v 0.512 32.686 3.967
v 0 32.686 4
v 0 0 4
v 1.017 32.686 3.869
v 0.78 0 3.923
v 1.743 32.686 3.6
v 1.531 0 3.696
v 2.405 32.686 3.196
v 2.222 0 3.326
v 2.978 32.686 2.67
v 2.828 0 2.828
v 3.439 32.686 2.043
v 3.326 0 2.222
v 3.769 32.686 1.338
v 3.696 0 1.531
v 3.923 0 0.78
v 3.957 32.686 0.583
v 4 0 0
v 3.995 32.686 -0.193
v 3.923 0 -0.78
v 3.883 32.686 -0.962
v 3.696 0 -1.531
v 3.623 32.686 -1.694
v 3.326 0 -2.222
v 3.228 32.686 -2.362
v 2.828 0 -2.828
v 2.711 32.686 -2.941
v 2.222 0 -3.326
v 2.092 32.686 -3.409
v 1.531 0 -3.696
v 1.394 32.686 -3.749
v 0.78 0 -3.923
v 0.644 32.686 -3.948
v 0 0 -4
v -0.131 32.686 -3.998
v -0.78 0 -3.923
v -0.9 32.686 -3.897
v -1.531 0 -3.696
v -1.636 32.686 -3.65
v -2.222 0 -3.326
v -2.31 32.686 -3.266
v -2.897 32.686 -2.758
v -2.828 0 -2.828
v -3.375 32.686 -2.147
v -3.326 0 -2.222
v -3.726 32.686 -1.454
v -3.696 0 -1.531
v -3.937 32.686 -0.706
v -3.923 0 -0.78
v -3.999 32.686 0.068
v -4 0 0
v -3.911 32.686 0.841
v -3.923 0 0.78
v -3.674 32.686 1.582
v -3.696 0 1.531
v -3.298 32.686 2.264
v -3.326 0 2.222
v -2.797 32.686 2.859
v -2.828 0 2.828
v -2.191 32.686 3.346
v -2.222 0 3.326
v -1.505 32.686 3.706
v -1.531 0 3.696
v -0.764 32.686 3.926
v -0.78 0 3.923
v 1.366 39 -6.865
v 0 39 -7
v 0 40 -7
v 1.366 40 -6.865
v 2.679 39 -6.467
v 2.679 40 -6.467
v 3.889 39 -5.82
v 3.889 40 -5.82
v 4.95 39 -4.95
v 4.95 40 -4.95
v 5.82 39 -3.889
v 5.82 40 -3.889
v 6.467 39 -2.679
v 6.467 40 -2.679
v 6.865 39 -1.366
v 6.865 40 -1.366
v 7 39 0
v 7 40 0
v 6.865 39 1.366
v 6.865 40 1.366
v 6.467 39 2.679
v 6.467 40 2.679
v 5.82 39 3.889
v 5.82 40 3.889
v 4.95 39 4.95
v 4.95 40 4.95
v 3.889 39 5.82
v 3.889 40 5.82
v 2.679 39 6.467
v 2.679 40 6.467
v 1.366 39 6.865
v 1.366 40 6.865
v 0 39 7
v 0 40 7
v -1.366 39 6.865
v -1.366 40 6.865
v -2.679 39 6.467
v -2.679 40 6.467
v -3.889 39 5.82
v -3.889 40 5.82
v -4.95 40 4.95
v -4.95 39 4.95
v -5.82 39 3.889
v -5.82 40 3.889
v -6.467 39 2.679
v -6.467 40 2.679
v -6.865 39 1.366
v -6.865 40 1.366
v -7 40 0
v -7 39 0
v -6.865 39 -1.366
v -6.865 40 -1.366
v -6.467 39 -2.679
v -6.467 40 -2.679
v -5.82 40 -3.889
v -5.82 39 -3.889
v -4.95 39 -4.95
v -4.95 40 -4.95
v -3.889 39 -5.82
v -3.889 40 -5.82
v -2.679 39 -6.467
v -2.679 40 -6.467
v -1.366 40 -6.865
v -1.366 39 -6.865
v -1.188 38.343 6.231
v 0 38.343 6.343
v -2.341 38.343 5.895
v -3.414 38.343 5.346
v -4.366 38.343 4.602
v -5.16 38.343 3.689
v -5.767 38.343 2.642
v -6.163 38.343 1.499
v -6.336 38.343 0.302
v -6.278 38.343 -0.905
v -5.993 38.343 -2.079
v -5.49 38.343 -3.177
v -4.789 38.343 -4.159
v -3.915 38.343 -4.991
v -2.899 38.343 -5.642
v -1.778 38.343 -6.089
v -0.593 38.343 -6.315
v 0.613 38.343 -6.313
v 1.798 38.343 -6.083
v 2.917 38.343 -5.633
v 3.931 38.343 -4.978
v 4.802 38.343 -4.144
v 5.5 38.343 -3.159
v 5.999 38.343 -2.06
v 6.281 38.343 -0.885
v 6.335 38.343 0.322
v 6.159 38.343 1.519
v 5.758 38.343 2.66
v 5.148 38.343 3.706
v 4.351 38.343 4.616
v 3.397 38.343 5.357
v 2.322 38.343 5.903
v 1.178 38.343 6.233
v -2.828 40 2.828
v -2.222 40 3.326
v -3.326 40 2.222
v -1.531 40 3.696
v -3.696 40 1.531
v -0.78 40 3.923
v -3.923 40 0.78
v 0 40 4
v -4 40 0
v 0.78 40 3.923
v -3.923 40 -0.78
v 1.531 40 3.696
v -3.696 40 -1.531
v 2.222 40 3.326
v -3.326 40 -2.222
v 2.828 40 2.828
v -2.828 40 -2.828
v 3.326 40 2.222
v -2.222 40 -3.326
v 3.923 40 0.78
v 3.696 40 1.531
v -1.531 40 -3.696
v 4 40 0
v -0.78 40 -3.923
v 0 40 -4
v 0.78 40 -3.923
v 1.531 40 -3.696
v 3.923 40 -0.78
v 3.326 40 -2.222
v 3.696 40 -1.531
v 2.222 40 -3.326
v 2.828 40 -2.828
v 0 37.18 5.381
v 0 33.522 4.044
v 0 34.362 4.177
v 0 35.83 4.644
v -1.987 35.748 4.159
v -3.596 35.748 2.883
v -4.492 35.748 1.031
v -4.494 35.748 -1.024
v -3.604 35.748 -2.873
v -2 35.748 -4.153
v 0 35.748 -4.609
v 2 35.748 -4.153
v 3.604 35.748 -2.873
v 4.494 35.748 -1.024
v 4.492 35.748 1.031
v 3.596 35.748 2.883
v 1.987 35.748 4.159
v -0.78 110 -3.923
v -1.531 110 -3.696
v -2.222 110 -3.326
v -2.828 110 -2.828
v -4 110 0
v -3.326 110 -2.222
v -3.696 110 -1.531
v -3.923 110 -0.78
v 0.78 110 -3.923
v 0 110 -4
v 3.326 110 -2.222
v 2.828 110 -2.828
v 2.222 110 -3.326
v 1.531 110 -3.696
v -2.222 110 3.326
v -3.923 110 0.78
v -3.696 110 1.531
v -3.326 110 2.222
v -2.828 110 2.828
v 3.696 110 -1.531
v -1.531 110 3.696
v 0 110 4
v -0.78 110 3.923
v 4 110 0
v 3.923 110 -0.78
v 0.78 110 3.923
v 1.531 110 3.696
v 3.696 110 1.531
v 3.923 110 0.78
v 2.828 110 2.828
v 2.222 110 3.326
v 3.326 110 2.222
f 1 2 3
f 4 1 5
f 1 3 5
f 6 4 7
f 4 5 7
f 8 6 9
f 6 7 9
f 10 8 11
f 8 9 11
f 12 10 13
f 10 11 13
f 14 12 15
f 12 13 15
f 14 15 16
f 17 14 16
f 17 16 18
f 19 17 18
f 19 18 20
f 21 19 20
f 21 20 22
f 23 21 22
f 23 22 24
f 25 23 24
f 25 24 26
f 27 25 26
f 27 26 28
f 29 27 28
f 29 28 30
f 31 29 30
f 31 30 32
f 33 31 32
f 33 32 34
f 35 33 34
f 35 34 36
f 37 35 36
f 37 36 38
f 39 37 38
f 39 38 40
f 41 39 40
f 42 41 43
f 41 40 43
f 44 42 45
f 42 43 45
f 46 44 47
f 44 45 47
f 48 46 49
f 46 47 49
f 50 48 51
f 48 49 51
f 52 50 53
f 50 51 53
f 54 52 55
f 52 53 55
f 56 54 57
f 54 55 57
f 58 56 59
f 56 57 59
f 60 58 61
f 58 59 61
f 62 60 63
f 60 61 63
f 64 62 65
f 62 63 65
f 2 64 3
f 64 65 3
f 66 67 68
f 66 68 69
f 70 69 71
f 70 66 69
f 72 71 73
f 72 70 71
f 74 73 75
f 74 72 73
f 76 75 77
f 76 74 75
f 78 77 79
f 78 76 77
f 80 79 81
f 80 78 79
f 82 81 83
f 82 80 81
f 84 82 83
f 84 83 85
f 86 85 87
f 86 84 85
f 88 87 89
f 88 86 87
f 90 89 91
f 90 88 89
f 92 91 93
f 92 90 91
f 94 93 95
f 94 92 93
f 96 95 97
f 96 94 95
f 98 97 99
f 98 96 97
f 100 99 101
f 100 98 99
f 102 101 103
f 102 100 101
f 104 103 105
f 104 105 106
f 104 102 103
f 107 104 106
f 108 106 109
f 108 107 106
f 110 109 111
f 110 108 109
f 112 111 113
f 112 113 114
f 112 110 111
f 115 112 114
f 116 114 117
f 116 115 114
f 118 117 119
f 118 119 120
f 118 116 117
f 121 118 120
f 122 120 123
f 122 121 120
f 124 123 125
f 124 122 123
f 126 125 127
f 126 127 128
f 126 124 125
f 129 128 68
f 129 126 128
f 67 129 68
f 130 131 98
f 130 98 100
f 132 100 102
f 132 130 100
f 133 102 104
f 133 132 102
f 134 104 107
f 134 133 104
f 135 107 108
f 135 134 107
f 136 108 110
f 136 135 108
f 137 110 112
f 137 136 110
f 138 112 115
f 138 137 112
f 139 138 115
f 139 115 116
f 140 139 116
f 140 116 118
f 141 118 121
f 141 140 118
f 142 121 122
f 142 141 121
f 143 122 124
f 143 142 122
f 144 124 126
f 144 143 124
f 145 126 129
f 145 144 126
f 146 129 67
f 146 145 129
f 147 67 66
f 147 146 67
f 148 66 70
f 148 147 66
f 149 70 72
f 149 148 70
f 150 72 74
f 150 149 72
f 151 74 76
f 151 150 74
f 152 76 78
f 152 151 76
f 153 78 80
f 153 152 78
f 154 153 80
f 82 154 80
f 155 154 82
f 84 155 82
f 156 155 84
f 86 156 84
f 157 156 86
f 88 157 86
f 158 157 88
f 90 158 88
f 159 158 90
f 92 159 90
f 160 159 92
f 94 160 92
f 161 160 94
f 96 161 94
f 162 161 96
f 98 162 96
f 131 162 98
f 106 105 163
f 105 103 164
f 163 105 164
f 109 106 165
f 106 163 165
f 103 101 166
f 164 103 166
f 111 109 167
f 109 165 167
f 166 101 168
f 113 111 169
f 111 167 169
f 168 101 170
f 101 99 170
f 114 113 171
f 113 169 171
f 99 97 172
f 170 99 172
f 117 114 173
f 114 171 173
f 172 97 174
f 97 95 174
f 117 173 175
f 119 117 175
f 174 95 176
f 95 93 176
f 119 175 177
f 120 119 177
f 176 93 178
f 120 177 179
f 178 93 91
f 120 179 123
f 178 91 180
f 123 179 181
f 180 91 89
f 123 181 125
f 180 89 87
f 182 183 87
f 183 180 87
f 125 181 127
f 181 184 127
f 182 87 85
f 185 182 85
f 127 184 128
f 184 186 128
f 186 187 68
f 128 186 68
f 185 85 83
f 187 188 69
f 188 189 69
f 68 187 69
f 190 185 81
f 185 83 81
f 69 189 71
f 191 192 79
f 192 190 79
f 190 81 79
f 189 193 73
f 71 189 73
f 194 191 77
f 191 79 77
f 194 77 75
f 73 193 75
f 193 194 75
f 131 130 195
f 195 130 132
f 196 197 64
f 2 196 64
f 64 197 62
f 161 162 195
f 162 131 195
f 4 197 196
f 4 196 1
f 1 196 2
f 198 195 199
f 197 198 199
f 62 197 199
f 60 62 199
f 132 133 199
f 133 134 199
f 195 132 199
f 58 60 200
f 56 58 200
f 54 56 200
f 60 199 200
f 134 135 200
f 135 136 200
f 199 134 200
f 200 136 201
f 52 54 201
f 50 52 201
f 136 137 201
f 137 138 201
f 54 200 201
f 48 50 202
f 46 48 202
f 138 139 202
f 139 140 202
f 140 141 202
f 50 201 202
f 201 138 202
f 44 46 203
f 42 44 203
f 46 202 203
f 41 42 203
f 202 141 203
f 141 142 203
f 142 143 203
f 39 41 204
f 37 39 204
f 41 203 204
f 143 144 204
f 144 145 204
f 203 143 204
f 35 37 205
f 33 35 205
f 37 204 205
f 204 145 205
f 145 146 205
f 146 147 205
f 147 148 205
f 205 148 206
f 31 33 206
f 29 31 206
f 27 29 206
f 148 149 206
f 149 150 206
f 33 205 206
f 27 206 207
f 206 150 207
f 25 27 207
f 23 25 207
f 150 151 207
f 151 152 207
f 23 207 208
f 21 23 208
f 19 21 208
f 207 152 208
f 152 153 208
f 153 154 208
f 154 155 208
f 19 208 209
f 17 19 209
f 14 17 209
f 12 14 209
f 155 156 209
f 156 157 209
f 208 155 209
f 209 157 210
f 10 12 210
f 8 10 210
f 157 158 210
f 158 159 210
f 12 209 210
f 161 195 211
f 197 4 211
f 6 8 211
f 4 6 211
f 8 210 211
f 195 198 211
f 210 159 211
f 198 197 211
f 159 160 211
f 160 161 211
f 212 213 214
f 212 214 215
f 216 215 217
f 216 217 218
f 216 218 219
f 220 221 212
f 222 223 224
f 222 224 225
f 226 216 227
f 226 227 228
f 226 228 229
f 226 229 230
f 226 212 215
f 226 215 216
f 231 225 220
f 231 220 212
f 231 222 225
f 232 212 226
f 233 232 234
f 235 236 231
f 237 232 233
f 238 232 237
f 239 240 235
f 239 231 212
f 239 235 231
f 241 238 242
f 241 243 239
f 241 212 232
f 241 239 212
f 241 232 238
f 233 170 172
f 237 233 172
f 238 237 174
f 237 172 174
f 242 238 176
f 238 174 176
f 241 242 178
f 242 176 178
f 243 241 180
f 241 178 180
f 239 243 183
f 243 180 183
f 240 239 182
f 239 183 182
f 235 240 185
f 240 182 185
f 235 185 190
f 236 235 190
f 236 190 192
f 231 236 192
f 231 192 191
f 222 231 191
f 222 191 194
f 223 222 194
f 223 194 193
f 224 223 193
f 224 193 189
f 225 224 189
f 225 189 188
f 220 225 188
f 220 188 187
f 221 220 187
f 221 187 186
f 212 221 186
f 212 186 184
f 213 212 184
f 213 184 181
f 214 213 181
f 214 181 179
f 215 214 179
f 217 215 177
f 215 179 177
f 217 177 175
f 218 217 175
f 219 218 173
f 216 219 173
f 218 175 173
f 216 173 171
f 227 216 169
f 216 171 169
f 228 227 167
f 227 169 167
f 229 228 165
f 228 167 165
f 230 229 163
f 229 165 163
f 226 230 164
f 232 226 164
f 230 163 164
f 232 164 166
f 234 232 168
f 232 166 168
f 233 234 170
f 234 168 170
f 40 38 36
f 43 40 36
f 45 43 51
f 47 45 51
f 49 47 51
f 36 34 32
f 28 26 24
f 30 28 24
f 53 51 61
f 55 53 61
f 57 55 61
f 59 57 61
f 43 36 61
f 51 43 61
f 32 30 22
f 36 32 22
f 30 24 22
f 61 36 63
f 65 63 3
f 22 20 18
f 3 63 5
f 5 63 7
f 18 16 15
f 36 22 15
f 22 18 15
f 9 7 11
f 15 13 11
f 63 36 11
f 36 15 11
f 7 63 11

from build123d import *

# Parameters (mm, degrees)
SKETCH1_R           = 4
BOSS_EXTRUDE1_DEPTH = 110
SKETCH2_R           = 7
BOSS_EXTRUDE2_DEPTH = 1
CHAMFER1_SIZE       = 3
FILLET1_R           = 8


with BuildPart() as part:
    # Sketch1 → Boss-Extrude1 (new body)
    with BuildSketch(Plane(origin=(0, 0, 0), x_dir=(1, 0, 0), z_dir=(0, 1, 0))):
        with Locations(Location((0, 0, 0), (0, 0, 270))):
            Circle(SKETCH1_R)
    extrude(amount=BOSS_EXTRUDE1_DEPTH)

    # Sketch2 → Boss-Extrude2 (add)
    with BuildSketch(Plane(origin=(0, 39, 0), x_dir=(-1, 0, 0), z_dir=(0, -1, 0))):
        with Locations(Location((0, 0, 0), (0, 0, 90))):
            Circle(SKETCH2_R)
    extrude(amount=-BOSS_EXTRUDE2_DEPTH)

    # Chamfer1
    chamfer1_edges = [part.edges().sort_by_distance(p)[0] for p in [
        (0, 39, -4),
    ]]
    chamfer(chamfer1_edges, length=CHAMFER1_SIZE - 0.0001)  # a hair under: the kernel refuses the full size

    # Fillet1
    fillet1_edges = [part.edges().sort_by_distance(p)[0] for p in [
        (0, 36.0001, -4),
    ]]
    fillet(fillet1_edges, radius=FILLET1_R)


solid = part.part
